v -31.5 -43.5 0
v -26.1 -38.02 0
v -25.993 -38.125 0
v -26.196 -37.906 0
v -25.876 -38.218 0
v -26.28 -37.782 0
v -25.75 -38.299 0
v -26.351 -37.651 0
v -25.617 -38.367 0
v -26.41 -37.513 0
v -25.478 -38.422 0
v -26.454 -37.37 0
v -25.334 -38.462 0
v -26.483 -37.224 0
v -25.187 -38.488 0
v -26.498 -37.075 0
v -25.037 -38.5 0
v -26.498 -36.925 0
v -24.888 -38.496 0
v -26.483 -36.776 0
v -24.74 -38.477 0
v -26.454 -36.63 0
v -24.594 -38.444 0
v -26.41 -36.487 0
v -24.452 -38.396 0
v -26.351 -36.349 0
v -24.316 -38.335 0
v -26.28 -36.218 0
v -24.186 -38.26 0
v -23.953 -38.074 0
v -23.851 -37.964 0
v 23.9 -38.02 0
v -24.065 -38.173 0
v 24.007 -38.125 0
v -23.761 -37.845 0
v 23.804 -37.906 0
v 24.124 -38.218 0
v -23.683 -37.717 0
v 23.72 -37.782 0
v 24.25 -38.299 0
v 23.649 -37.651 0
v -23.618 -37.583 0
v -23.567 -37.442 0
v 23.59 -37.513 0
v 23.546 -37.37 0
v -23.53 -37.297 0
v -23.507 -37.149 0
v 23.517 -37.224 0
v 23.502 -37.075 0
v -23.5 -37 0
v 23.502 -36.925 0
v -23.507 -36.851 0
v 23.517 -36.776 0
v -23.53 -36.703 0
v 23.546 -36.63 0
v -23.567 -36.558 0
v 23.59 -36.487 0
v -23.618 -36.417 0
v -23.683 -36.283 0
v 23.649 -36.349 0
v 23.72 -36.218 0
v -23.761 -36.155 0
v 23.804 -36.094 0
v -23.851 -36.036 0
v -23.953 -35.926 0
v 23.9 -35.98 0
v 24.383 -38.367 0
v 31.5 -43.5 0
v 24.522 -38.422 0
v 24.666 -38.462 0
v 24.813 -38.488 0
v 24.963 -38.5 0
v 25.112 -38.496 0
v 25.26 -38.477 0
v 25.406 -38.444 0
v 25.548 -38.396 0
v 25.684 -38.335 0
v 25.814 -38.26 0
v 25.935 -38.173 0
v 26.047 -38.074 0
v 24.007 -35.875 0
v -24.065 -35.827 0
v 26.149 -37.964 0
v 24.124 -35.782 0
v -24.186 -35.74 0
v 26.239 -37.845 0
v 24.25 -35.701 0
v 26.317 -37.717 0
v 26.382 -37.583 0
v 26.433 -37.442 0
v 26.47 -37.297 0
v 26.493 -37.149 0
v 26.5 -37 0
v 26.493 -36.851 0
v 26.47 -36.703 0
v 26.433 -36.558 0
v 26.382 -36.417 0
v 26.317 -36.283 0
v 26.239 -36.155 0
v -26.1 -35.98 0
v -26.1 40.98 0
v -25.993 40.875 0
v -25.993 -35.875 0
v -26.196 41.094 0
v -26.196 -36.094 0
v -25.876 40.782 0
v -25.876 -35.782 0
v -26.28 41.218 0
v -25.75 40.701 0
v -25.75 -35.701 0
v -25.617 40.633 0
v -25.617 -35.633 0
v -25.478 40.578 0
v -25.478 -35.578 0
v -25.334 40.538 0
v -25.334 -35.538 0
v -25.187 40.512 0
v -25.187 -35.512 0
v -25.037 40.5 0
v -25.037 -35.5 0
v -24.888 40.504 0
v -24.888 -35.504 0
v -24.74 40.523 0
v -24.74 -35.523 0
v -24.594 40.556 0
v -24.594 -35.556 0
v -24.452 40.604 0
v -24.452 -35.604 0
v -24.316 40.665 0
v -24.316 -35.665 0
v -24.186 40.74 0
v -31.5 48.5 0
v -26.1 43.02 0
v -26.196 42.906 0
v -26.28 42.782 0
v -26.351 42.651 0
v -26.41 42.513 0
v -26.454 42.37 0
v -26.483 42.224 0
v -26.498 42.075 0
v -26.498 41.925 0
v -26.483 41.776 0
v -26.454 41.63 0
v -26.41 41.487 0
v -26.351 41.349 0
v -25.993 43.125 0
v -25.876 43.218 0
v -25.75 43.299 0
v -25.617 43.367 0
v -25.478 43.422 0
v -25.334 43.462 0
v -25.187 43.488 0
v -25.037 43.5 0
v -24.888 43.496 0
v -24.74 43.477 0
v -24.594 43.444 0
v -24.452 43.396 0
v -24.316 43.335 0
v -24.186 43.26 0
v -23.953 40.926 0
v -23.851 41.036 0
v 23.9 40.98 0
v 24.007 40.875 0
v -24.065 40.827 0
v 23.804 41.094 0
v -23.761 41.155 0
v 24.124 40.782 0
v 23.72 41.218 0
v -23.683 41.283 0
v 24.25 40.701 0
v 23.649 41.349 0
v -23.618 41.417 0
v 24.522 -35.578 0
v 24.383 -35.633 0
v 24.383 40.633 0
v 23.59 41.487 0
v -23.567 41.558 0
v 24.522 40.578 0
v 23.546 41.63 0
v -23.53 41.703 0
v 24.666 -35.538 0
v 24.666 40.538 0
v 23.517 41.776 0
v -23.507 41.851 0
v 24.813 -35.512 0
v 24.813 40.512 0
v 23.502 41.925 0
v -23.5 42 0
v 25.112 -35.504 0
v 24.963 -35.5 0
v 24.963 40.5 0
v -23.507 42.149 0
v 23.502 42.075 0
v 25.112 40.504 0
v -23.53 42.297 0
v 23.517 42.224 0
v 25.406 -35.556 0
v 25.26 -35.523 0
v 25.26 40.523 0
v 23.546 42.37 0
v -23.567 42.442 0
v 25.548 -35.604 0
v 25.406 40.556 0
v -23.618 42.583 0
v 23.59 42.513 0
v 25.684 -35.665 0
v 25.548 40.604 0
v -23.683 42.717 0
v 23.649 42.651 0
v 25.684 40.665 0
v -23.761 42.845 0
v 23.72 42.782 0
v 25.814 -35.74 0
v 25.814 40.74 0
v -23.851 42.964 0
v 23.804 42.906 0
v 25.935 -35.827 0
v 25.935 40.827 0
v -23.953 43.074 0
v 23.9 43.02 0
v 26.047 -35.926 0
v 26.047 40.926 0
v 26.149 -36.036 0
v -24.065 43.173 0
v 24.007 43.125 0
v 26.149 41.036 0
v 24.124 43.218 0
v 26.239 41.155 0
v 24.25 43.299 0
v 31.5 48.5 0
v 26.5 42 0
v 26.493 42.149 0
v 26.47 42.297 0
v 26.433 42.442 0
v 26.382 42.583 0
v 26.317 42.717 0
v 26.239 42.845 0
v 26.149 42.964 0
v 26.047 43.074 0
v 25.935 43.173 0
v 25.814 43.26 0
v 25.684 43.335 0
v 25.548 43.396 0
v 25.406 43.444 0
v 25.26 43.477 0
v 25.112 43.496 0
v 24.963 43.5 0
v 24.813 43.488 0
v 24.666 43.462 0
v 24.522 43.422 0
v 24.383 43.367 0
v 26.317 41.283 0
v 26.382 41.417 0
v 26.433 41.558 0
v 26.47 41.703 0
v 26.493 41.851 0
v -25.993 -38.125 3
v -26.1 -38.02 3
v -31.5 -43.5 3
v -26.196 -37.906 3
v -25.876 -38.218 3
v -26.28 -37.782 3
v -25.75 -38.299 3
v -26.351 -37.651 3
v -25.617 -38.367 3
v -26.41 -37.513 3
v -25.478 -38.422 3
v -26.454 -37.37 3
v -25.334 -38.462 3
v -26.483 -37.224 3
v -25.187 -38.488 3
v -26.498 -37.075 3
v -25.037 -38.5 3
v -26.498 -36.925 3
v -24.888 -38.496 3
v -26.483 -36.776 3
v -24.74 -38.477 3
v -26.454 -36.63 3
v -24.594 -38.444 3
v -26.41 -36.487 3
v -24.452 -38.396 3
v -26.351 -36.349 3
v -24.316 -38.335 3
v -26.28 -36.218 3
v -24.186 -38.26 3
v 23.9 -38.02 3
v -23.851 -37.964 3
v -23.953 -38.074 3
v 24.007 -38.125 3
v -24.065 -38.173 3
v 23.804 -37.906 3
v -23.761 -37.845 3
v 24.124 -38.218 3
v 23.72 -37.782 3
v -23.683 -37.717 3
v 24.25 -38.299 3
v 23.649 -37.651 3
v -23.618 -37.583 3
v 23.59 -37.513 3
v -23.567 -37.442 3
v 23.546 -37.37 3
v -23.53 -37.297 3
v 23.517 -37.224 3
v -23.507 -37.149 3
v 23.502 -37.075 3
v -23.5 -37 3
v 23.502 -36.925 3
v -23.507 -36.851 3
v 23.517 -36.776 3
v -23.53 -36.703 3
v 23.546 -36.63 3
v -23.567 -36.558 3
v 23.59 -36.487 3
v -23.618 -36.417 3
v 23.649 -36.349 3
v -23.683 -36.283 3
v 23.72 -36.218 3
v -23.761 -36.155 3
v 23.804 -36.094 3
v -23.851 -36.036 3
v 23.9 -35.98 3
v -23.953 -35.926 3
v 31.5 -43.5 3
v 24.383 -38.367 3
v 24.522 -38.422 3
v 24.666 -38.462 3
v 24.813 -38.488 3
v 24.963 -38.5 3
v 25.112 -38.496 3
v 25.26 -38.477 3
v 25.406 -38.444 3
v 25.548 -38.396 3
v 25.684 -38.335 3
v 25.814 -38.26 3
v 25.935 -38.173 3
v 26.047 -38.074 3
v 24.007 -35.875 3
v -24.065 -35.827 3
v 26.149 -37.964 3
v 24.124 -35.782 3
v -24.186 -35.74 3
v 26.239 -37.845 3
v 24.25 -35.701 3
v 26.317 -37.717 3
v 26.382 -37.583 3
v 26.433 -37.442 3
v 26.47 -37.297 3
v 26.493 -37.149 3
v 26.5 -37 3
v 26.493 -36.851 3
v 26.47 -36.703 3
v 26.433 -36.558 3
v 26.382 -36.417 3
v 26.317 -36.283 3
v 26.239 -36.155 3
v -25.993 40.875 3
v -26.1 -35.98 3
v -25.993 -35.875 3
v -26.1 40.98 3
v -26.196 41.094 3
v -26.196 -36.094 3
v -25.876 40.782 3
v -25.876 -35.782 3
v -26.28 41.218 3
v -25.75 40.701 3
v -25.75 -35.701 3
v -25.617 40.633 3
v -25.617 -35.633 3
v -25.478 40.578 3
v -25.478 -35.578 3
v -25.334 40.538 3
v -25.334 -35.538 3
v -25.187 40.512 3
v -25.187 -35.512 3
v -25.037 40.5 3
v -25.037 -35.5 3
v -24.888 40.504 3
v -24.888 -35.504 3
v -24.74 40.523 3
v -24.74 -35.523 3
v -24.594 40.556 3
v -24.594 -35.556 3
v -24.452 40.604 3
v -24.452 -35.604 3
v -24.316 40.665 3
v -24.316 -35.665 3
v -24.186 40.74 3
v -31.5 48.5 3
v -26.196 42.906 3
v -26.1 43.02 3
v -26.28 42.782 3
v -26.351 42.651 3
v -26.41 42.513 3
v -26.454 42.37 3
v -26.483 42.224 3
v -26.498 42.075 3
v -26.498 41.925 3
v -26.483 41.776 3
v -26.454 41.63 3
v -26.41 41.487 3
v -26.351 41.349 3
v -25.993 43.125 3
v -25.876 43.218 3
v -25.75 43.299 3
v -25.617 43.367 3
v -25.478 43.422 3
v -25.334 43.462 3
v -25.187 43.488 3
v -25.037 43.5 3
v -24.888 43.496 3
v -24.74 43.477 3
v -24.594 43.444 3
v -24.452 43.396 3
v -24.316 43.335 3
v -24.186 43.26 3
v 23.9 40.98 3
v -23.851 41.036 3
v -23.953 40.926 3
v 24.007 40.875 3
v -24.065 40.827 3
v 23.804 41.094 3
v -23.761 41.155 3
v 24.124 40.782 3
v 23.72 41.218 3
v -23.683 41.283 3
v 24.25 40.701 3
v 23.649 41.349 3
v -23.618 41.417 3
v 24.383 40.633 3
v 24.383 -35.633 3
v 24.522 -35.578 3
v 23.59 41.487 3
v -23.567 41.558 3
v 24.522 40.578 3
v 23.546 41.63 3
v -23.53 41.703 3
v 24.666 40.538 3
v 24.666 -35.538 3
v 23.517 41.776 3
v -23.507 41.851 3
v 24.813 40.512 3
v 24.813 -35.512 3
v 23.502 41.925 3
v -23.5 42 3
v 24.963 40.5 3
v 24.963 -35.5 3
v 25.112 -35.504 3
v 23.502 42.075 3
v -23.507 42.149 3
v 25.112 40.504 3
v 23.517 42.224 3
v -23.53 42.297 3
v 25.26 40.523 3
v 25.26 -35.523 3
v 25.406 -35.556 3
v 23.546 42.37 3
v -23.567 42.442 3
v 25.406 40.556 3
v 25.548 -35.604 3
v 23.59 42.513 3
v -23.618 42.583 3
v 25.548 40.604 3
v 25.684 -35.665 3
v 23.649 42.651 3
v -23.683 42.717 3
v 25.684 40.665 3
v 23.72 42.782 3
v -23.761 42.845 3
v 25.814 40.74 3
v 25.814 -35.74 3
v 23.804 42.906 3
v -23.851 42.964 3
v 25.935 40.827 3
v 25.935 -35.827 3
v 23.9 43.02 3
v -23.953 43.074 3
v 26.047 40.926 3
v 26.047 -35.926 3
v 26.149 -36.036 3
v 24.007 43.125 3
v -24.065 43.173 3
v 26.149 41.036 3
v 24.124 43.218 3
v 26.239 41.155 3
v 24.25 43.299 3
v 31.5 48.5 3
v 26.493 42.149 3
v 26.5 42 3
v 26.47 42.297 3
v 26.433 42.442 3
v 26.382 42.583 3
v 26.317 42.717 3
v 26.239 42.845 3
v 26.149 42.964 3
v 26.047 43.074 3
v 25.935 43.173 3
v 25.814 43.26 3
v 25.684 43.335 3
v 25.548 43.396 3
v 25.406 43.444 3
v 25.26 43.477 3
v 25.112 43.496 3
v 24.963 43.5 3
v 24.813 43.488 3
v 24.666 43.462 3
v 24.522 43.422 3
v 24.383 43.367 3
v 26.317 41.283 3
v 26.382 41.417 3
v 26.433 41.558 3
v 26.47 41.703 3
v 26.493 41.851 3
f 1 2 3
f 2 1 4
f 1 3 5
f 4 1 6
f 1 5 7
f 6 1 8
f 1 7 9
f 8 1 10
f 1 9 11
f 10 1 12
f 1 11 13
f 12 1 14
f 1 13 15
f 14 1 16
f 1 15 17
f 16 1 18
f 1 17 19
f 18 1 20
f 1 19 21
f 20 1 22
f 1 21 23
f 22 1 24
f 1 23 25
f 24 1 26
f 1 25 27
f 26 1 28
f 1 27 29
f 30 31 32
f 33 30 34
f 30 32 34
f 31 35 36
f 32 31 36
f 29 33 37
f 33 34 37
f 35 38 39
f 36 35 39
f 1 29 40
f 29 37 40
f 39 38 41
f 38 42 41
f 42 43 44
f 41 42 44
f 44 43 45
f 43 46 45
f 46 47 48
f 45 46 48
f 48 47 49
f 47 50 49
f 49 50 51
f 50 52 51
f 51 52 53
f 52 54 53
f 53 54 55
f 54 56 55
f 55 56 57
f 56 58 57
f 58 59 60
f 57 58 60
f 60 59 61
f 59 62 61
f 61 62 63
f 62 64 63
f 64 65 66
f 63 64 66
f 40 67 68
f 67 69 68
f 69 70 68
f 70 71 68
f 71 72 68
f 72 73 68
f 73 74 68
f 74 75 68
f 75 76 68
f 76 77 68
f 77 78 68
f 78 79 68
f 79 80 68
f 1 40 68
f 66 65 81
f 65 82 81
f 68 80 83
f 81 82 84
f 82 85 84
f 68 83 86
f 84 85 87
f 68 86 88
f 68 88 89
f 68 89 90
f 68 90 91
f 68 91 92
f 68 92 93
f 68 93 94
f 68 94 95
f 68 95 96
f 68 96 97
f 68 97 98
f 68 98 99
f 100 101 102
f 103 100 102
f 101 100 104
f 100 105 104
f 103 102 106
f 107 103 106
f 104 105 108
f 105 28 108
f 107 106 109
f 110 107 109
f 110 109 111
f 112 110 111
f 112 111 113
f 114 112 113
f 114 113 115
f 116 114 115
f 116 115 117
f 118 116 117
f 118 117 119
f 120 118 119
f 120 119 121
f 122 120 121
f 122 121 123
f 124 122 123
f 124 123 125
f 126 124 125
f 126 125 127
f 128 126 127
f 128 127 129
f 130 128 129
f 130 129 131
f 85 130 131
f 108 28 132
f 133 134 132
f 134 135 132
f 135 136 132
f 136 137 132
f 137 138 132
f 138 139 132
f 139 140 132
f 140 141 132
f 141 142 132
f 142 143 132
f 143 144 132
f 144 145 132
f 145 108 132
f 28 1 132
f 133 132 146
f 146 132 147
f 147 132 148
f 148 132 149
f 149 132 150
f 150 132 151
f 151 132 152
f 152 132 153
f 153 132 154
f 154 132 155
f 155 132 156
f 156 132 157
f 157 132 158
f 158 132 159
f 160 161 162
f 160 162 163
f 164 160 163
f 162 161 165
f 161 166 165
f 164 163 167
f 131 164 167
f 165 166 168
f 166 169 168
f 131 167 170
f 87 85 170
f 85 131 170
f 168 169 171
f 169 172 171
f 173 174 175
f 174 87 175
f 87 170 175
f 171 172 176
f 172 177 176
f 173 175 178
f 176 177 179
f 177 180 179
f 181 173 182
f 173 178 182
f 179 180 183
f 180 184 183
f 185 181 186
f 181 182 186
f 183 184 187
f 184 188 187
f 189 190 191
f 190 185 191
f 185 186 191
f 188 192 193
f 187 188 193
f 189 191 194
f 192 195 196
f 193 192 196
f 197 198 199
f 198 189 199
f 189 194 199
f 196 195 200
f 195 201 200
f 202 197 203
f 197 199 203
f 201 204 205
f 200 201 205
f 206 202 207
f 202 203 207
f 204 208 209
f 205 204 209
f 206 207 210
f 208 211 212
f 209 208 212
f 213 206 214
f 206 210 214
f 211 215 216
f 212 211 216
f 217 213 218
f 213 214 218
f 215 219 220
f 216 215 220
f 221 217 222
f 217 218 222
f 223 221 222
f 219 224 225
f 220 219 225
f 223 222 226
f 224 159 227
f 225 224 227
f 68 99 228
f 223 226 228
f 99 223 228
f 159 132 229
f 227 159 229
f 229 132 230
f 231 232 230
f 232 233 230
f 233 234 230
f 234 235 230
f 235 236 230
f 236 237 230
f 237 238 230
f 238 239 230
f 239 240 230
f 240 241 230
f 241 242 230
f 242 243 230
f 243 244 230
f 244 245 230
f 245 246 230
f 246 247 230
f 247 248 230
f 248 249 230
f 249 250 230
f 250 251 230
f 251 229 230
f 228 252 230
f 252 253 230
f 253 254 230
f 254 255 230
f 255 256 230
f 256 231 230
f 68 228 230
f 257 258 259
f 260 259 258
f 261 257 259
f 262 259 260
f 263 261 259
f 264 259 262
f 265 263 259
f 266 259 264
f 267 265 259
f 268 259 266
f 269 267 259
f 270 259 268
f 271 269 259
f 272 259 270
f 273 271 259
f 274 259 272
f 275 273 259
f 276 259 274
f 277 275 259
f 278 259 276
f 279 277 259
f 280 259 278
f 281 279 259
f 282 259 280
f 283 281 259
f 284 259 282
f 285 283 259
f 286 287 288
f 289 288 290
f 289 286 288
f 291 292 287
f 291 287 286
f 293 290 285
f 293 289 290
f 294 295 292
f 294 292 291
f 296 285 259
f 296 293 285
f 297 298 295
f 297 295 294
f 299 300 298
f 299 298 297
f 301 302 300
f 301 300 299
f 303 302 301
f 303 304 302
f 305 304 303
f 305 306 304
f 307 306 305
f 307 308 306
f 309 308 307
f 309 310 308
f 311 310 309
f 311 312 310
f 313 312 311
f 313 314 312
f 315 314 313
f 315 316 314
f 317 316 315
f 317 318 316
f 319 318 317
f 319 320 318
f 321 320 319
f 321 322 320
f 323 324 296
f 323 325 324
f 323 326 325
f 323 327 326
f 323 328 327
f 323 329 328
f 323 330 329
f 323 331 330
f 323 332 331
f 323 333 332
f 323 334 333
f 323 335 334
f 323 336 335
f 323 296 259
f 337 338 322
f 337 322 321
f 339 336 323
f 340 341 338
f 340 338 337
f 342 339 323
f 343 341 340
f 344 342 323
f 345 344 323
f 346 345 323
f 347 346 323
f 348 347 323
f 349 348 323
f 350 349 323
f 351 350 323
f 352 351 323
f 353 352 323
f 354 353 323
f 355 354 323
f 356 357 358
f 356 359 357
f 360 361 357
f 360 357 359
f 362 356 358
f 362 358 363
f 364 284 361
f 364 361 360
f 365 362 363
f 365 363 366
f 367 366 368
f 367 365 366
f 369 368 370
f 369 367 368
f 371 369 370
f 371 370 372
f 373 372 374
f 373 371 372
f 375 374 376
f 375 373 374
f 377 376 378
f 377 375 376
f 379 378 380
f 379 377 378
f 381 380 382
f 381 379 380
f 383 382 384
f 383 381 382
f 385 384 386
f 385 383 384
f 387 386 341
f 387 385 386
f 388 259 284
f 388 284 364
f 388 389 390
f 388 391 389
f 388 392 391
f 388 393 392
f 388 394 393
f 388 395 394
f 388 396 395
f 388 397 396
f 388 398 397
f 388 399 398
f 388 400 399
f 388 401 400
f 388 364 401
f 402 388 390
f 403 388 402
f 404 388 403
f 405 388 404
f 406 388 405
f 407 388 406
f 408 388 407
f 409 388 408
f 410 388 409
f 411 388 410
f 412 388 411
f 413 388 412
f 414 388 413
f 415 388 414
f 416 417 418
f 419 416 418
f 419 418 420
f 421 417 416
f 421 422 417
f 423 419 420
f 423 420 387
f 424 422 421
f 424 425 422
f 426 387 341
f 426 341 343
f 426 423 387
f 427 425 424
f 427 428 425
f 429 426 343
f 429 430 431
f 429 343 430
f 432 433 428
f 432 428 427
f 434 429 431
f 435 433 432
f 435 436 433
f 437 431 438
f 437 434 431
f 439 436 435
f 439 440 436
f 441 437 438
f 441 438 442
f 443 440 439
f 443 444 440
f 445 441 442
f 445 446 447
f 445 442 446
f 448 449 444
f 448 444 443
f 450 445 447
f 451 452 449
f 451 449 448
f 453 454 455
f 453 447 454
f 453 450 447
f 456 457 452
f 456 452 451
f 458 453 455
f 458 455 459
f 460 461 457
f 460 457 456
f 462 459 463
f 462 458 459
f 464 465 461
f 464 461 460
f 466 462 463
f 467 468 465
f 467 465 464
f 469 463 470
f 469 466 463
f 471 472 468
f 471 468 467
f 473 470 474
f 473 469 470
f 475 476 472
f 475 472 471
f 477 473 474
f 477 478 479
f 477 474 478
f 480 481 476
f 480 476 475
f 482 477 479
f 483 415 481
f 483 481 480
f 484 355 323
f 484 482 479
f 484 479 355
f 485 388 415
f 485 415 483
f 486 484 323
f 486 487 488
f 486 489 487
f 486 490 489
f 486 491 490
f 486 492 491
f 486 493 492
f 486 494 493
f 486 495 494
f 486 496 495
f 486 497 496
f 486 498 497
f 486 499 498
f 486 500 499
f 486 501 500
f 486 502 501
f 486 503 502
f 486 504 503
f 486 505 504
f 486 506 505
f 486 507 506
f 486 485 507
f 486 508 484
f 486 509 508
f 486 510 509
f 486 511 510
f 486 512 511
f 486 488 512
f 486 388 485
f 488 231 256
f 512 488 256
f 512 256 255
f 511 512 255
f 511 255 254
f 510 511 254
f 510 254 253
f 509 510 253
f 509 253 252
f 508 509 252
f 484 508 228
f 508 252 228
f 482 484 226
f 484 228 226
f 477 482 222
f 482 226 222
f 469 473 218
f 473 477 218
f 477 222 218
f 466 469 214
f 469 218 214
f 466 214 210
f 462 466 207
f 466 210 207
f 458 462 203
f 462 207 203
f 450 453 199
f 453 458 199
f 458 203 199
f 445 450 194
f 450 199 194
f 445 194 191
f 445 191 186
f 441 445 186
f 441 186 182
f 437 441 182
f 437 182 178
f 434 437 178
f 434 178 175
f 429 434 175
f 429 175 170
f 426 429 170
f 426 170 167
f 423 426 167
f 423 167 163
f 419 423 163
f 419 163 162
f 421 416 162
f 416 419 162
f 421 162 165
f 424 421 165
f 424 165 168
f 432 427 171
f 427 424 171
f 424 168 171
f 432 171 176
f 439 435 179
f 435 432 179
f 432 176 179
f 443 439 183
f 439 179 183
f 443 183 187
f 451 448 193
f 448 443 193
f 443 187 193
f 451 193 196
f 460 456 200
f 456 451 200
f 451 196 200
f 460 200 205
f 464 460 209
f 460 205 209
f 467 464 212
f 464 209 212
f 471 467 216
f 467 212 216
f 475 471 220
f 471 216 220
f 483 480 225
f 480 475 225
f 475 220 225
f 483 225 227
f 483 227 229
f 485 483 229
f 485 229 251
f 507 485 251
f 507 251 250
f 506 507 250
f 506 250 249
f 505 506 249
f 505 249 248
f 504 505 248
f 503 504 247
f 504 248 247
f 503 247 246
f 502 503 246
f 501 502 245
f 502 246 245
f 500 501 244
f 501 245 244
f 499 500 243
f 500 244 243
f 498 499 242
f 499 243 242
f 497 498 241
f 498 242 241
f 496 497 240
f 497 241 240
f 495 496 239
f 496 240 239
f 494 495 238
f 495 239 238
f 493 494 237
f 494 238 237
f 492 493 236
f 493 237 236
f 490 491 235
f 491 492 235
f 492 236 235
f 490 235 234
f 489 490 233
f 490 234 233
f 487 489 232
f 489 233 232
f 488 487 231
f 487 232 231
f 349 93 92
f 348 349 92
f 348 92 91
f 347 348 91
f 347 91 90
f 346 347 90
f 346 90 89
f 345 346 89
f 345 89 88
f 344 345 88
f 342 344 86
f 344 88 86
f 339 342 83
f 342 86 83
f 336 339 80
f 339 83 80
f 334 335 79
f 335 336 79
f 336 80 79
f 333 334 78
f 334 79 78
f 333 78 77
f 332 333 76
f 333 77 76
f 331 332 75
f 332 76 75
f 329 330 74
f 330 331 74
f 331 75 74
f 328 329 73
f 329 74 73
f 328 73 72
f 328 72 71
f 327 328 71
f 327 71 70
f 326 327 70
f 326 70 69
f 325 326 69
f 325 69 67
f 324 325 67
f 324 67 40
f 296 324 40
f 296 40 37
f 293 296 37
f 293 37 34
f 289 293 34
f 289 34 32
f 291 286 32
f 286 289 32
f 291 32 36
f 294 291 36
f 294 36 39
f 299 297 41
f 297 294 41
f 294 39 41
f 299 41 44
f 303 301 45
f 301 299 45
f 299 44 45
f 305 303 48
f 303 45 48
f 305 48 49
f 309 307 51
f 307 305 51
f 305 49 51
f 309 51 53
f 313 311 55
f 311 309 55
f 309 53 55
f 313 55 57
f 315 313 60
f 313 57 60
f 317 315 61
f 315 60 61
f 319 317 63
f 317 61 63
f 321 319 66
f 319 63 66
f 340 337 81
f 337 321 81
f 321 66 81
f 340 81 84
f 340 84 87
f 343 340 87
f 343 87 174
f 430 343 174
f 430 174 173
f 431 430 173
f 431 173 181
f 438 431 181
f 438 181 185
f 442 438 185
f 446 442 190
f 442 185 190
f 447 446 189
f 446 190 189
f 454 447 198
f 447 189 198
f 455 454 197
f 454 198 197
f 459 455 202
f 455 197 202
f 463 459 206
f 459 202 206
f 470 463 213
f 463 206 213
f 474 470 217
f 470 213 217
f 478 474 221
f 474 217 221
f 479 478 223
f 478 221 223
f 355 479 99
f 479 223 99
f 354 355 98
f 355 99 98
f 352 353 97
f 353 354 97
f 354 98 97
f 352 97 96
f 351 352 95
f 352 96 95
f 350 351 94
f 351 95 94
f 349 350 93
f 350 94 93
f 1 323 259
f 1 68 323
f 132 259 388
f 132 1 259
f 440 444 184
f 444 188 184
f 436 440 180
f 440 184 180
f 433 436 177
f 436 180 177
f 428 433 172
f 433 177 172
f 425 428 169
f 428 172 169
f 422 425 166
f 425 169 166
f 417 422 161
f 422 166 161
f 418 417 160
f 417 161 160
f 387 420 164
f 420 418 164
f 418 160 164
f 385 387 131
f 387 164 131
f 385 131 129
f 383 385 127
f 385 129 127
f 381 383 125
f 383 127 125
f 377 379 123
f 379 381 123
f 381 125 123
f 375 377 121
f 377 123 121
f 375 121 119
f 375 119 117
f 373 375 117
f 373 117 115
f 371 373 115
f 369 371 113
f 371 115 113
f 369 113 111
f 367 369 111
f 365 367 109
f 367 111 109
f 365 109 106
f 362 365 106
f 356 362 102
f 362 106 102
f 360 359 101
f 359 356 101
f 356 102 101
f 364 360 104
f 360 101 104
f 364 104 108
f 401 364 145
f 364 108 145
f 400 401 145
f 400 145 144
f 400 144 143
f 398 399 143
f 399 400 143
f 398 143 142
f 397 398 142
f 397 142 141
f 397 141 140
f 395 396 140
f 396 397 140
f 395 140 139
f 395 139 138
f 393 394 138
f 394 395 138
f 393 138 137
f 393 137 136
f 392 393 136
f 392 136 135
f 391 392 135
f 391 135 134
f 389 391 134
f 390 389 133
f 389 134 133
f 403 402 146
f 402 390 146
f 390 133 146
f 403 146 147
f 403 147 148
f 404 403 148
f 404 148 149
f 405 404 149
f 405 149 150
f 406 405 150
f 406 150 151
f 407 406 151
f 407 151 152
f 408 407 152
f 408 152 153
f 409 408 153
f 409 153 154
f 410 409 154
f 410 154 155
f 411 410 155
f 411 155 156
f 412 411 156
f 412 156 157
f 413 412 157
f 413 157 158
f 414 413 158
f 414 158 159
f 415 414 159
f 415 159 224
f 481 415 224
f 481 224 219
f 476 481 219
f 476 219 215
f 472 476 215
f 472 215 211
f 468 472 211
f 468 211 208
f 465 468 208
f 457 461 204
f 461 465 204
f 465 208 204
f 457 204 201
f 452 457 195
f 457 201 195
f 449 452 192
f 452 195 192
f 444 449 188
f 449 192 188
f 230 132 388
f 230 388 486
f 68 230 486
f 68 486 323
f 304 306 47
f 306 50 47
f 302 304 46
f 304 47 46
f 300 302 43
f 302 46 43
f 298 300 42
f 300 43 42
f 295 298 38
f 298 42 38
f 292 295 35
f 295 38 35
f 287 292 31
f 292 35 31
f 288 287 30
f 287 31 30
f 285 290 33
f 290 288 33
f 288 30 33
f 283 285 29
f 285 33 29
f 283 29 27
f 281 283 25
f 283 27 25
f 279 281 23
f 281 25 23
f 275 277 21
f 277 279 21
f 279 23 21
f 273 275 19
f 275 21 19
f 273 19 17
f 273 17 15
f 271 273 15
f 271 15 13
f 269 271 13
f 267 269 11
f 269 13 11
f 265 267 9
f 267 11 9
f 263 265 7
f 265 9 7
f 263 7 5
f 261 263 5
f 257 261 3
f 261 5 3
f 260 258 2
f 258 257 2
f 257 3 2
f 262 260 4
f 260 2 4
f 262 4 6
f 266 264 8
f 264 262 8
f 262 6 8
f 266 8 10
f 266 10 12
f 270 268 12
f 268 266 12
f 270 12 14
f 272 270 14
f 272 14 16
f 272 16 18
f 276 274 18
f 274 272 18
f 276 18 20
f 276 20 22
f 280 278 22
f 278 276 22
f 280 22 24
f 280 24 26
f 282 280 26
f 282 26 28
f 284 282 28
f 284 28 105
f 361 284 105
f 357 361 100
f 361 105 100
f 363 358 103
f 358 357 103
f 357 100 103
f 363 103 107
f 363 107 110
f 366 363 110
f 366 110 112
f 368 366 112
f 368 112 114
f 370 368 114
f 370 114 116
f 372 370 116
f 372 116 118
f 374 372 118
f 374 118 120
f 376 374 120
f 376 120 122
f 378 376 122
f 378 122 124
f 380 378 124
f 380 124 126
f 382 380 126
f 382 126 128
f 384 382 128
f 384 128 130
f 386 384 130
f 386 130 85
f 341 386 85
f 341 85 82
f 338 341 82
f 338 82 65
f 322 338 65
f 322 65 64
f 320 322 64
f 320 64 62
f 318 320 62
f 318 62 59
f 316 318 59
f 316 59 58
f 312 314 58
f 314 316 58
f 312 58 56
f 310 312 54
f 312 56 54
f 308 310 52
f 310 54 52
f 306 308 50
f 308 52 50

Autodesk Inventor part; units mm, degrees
ref_plane "YZ Plane" through (0, 0, 0) normal (1, 0, 0) x (0, 1, 0)
ref_plane "XZ Plane" through (0, 0, 0) normal (0, 1, 0) x (-1, 0, 0)
ref_plane "XY Plane" through (0, 0, 0) normal (0, 0, 1) x (1, 0, 0)
sketch "Sketch1" plane through (0, 0, 0) normal (0, 0, 1) x (1, 0, 0)
  line L0 (31.5, 48.5) -> (31.5, -43.5)
  line L1 (31.5, -43.5) -> (-31.5, -43.5)
  line L2 (-31.5, -43.5) -> (-31.5, 48.5)
  line L3 (-31.5, 48.5) -> (31.5, 48.5)
  line L4 (25, -37) -> (25, 42) construction
  line L5 (25, 42) -> (-25, 42) construction
  line L6 (-25, 42) -> (-25, -37) construction
  line L7 (-25, -37) -> (25, -37) construction
  circle A0 centre (25, 42) radius 1.5 projected
  circle A1 centre (25, -37) radius 1.5 projected
  circle A2 centre (-25, -37) radius 1.5 projected
  circle A3 centre (-25, 42) radius 1.5 projected
  point P0 (0, 0)
  dimension "d0" = 5
extrude "Extrusion1" add sketch "Sketch1" along normal blind 3
properties part number "base teclado"
